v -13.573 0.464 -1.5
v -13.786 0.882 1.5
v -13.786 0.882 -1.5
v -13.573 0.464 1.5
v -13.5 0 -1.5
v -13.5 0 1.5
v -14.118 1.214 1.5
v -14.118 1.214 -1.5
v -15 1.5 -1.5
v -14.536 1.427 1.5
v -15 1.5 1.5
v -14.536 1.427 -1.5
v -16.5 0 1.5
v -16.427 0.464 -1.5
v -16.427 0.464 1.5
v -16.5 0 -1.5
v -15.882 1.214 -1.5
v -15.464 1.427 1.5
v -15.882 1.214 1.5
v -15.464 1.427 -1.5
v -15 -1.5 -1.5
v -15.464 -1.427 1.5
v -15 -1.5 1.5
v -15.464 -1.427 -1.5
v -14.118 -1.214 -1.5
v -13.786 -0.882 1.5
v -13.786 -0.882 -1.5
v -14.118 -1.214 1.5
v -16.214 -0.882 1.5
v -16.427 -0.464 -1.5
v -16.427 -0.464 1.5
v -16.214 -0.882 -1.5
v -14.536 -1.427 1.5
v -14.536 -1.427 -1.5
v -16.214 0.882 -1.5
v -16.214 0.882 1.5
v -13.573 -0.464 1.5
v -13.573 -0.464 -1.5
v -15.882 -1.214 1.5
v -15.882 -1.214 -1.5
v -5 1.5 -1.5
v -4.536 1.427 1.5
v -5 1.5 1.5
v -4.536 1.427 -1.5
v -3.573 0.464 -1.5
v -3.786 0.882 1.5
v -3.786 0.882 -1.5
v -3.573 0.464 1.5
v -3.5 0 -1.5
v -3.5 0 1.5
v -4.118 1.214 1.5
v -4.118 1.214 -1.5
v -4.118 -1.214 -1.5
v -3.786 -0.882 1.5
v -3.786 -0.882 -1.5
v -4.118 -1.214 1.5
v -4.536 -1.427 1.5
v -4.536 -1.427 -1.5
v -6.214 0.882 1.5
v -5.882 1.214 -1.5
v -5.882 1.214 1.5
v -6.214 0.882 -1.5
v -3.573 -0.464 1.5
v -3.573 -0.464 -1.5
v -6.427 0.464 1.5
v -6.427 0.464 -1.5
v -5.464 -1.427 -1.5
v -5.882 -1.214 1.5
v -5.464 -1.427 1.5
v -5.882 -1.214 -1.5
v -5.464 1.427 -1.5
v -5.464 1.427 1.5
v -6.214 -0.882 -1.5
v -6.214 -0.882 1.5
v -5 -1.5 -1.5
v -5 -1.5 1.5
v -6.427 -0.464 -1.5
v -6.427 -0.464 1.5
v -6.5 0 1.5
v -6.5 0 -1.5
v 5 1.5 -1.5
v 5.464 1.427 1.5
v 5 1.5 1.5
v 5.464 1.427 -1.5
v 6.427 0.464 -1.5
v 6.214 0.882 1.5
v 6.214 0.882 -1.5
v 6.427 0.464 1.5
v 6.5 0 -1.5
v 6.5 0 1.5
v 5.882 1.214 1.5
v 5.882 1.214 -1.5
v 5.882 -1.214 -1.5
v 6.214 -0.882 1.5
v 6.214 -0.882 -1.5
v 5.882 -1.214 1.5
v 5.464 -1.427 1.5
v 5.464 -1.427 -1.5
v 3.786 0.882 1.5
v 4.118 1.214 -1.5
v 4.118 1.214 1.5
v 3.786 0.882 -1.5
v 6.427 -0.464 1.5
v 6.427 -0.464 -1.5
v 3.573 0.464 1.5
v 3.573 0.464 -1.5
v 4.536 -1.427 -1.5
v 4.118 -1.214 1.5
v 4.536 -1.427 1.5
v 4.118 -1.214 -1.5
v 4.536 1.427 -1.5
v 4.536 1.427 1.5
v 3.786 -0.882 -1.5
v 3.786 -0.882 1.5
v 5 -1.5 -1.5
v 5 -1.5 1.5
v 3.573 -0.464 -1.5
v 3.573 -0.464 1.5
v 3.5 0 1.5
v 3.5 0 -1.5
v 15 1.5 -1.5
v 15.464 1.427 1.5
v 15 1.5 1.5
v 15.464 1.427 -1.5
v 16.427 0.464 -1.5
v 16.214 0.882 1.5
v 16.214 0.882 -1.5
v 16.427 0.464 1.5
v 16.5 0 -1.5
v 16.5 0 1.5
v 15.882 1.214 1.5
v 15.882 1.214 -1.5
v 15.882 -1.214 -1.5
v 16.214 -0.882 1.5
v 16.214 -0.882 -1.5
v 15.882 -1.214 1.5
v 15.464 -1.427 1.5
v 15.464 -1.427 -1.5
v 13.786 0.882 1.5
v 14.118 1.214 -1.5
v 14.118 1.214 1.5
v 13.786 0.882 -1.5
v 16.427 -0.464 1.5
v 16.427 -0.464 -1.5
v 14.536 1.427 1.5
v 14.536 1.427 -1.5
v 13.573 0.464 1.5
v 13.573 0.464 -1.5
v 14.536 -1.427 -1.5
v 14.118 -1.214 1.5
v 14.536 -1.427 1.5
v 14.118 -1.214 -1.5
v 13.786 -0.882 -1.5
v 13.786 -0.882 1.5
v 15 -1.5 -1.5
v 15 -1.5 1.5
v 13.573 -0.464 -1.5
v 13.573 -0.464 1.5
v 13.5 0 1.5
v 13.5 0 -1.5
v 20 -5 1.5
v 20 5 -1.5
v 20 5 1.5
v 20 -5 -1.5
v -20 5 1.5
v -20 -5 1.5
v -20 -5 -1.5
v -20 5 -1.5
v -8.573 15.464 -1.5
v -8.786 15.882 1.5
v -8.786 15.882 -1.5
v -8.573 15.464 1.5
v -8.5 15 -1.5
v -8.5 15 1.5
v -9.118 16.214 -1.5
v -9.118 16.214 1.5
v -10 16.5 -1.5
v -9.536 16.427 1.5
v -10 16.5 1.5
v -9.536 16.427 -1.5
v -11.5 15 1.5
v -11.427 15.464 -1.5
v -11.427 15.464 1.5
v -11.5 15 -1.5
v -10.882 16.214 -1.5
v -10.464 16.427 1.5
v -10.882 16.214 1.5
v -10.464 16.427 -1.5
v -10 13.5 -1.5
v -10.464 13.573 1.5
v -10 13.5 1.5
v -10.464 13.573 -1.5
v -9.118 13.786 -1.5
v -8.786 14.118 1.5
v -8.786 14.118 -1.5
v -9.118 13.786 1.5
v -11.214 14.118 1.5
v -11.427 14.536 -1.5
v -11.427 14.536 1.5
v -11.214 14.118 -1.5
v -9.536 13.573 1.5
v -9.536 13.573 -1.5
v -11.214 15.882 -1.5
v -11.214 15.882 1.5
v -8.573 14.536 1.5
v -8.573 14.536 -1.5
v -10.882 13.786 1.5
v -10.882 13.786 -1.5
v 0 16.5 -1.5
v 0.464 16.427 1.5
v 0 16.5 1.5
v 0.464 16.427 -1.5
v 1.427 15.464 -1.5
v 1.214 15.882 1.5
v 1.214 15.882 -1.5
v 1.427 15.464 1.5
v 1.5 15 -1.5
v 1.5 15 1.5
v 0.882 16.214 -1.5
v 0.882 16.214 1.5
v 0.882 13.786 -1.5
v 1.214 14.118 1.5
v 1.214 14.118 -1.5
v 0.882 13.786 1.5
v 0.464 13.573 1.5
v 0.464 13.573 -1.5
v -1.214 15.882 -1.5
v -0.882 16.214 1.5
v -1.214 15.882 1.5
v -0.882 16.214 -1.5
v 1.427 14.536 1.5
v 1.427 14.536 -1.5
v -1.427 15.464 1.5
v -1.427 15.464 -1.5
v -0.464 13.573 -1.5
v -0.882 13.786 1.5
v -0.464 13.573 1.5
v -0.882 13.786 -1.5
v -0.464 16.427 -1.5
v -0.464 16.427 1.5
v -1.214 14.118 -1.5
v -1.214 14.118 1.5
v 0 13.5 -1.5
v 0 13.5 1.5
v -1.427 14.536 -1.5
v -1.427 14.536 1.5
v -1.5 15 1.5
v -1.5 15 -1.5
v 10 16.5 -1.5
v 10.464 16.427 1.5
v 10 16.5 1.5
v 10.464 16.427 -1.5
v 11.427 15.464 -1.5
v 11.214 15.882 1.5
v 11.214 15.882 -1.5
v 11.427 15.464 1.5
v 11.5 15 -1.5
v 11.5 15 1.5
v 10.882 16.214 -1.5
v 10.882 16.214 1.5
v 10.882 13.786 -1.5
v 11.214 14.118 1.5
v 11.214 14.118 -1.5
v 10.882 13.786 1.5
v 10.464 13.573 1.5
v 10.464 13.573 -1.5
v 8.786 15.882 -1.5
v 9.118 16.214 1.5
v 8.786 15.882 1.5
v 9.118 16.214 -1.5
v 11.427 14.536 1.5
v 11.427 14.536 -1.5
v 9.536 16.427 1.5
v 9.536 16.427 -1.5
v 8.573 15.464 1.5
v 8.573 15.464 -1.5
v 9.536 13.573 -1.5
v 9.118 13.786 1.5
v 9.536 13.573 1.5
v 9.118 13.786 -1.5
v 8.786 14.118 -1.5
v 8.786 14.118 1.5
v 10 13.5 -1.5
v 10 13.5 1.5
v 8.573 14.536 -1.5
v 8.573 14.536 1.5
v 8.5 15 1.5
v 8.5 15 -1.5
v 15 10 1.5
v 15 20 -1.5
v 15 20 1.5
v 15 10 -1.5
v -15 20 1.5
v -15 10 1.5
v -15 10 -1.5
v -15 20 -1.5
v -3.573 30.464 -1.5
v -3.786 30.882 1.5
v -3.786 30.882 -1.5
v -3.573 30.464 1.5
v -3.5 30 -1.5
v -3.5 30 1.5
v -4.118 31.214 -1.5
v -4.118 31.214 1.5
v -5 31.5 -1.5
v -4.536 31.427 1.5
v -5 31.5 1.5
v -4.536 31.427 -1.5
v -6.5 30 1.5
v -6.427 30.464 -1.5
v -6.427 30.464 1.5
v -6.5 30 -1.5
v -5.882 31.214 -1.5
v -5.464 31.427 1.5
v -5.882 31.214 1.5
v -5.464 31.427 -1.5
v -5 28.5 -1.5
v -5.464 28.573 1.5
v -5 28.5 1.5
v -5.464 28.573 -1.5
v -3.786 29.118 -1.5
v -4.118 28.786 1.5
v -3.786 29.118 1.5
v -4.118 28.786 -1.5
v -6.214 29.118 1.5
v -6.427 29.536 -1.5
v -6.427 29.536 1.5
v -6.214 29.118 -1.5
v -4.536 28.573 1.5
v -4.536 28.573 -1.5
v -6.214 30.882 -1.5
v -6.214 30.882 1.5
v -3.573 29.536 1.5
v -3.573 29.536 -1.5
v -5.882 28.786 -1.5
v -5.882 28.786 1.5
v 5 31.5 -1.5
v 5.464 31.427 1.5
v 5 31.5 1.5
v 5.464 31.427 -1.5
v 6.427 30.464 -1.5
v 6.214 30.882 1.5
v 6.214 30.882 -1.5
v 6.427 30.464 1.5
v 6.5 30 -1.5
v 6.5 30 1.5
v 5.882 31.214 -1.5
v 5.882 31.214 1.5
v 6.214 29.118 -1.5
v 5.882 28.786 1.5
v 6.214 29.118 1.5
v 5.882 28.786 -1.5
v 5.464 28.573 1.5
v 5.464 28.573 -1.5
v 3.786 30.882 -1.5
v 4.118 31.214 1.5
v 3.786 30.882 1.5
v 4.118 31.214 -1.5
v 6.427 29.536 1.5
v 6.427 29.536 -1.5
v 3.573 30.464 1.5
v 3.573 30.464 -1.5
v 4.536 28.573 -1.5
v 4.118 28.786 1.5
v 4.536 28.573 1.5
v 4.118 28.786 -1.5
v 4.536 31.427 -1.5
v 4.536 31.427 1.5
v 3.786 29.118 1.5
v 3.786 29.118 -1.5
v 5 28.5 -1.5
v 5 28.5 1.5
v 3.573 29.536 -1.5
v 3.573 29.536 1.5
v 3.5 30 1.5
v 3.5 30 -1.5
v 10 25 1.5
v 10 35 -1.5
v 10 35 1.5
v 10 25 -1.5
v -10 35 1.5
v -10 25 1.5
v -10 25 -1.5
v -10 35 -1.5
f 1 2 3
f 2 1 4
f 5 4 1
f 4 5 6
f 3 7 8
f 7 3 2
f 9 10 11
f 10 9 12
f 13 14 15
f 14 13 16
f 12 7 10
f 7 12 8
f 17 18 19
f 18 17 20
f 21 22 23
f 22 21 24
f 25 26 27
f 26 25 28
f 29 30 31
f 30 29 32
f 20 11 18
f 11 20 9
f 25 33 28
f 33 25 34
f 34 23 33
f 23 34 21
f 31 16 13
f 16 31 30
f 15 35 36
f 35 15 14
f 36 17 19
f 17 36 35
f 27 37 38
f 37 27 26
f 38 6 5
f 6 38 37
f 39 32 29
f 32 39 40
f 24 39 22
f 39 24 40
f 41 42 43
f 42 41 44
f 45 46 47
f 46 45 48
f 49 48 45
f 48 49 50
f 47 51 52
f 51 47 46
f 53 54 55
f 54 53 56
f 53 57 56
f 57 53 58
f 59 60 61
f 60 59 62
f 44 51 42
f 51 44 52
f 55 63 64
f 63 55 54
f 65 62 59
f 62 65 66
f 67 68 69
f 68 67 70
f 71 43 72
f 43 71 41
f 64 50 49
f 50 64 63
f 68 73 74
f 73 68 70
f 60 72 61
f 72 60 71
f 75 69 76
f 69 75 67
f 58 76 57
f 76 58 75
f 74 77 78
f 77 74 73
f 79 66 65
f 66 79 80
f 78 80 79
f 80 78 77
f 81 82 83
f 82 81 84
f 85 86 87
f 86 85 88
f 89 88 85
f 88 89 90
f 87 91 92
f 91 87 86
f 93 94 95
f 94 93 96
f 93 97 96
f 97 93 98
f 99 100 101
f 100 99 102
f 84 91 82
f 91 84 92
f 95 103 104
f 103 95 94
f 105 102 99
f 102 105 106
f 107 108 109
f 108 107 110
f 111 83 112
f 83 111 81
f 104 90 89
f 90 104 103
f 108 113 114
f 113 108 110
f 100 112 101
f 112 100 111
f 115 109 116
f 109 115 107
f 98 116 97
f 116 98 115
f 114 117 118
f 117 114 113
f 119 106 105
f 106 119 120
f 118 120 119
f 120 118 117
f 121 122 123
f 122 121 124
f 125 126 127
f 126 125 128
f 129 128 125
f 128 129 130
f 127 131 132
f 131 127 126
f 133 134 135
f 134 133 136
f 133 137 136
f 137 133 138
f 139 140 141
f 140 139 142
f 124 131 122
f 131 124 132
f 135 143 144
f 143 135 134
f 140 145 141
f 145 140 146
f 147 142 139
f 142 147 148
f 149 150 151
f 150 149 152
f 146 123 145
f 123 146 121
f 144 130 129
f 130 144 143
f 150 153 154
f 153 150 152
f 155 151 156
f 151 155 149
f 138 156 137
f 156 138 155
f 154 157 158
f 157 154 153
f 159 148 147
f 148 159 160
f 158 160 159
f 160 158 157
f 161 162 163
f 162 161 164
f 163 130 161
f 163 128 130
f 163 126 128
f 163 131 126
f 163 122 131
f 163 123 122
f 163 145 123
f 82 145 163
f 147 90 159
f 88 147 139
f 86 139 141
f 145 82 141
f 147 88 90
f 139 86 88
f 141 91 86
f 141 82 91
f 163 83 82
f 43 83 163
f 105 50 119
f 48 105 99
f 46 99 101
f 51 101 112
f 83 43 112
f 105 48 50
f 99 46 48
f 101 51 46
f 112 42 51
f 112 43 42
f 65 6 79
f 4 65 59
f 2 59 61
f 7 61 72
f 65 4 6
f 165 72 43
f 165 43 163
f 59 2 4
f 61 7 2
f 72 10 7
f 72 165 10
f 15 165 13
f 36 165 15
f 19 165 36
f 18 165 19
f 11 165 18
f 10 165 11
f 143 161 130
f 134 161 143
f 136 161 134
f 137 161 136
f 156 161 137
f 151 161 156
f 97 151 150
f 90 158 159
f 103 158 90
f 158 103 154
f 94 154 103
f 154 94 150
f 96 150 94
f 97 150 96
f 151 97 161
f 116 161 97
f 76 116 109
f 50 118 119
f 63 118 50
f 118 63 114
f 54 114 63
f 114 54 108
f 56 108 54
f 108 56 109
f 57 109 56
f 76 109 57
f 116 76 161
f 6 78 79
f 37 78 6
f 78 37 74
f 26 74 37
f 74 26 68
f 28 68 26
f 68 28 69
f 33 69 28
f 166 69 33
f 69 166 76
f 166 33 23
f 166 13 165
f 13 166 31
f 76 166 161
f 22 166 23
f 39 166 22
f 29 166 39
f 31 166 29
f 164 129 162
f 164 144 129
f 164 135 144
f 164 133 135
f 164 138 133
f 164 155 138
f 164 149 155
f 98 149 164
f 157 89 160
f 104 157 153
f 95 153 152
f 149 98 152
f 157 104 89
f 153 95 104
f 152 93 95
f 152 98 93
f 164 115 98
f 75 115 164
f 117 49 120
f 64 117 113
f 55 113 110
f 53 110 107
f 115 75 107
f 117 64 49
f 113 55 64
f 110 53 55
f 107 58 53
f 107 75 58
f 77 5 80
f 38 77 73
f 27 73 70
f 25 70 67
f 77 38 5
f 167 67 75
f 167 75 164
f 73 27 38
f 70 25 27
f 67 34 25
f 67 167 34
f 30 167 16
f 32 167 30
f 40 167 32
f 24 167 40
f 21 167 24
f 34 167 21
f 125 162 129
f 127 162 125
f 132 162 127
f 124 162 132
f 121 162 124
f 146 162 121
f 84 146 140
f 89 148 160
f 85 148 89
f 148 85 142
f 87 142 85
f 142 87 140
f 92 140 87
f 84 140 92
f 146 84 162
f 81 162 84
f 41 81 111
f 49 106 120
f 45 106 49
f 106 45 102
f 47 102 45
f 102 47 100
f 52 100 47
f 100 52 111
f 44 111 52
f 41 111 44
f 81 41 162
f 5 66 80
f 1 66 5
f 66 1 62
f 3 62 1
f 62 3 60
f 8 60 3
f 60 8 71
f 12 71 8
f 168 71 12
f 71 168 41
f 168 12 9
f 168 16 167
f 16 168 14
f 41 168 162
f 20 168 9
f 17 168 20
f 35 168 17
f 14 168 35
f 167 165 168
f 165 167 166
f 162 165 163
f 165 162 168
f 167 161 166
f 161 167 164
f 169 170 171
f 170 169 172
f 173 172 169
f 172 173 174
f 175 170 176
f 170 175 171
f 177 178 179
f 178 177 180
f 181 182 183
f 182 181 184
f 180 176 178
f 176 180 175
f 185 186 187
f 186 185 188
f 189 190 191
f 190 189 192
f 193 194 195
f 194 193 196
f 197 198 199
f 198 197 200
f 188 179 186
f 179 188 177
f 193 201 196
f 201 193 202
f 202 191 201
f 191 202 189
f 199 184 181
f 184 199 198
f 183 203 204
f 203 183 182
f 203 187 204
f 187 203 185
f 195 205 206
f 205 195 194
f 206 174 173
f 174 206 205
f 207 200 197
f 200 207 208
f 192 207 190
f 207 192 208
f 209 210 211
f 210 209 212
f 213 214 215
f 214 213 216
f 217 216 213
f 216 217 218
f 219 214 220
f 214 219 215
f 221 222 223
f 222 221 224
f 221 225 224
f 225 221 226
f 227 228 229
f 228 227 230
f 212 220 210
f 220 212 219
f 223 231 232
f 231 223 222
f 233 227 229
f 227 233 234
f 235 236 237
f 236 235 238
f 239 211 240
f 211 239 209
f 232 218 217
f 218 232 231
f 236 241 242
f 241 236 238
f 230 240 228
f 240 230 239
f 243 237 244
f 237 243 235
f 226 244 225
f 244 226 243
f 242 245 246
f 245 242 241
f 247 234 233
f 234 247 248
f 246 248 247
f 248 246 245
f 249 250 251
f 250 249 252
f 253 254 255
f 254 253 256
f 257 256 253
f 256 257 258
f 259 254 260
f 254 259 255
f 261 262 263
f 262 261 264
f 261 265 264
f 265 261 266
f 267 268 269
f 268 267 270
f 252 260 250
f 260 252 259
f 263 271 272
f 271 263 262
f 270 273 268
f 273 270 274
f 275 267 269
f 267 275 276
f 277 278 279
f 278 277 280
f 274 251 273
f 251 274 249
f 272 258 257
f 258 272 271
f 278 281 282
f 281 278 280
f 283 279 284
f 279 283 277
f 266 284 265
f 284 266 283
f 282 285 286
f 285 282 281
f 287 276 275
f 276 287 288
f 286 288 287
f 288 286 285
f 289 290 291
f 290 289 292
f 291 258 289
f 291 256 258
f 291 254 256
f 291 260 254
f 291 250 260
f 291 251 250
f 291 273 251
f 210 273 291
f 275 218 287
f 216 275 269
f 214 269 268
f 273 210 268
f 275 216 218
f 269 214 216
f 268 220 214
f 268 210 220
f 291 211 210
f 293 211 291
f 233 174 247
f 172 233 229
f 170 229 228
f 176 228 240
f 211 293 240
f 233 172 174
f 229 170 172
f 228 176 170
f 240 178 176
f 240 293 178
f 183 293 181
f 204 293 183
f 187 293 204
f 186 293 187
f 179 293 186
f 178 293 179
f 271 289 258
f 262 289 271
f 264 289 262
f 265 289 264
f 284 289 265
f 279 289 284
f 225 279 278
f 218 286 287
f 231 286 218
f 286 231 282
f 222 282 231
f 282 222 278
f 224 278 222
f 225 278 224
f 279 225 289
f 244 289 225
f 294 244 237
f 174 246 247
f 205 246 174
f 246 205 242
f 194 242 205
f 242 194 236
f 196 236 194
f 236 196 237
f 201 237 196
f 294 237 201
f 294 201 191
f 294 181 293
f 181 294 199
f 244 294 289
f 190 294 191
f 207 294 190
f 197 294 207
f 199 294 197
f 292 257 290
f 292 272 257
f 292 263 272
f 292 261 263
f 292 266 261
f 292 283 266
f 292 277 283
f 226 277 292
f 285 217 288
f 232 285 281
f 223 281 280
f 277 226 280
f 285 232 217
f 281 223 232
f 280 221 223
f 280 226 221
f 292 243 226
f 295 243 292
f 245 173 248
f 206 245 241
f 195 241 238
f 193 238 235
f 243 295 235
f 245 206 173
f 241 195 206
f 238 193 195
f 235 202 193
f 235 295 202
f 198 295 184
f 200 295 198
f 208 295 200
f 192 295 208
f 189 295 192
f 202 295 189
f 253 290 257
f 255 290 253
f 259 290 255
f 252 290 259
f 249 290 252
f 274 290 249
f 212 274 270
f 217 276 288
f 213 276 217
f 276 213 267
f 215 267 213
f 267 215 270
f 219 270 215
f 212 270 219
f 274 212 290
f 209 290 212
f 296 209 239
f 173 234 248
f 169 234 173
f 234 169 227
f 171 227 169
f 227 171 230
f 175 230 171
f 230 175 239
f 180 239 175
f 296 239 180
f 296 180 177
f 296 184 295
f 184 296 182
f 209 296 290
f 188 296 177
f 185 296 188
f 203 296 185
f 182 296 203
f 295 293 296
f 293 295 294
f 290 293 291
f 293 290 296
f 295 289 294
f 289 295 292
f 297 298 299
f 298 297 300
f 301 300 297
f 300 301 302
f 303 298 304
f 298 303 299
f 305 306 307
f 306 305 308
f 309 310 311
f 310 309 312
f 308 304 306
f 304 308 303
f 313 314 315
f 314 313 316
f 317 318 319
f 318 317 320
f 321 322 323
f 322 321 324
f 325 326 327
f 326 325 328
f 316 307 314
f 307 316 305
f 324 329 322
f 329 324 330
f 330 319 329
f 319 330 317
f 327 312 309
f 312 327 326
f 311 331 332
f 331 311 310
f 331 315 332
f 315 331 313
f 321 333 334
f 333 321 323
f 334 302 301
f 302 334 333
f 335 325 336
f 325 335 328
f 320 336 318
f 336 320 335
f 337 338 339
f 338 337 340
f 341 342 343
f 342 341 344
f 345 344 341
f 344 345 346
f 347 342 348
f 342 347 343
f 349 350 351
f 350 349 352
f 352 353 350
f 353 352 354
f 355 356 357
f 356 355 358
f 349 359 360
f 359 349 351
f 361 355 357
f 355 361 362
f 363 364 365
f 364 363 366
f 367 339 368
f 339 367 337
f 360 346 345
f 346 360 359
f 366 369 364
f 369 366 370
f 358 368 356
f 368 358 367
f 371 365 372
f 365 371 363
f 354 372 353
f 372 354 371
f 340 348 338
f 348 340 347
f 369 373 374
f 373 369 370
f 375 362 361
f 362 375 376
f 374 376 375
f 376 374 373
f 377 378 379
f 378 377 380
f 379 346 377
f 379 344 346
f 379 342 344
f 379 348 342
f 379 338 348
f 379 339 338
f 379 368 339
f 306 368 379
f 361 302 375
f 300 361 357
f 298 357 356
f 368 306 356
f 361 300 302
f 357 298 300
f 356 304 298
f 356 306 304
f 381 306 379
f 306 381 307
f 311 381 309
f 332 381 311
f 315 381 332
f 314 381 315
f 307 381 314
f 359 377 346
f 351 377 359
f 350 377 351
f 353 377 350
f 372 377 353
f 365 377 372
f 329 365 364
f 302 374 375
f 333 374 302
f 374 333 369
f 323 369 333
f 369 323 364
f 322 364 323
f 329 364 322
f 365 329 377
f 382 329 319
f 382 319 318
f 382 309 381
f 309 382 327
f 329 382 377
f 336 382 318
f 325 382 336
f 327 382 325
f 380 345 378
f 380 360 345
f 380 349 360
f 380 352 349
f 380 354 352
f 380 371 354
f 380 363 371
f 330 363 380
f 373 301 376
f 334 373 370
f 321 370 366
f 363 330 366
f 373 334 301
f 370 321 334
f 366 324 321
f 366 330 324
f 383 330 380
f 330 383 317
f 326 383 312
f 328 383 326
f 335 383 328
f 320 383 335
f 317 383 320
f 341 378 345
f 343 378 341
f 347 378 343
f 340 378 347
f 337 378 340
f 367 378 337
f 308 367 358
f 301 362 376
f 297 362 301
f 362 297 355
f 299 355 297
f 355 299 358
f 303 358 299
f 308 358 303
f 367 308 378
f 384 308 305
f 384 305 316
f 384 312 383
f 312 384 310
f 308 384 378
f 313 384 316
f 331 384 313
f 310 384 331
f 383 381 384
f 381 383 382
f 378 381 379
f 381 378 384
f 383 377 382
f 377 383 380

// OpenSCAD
// file: pieza_mecano.scad
use <./utils/build_plate.scad> // Cuadricula transparente para la base
build_plate(3, 200,100); // No se incluye al renderizar


module pieza_mecano(drill=3, d=10, n=4, anchura=10, grosor=3)
{

  //-- Calcular la longitud de la pieza
  lx = n*d;

  //-- Construimos la pieza
  difference() {
    //-- Cuerpo de la pieza
    cube([lx,anchura,grosor],center=true);

    //-- Taladros
    translate([-lx/2+d/2,0,0])
      for (i=[0:n-1]) {
        translate([i*d,0,0])
          cylinder(r=drill/2, h=grosor+5, $fn=20,center=true);
    }
  }
}

//-- Ejemplos de utilizacion
pieza_mecano();


translate([0,20,0])
  pieza_mecano(n=2);
// file: utils/build_plate.scad
// Build Plate representation module
// Made by Makerbot (http://curriculum.makerbot.com/daily_lessons/february/openscad_buildplate.html)

//use this to include a build plate visualization in your openSCAD scripts. Very useful for things designed to be edited in Makerbot Customizer

//to use, either include or use <utils/build_plate.scad>

//then just call build_plate(); with the following arguments (also, you have to have a real object in your scene for this to render)

//putting 0 as the first argument will give you a Replicator 2 build plate
//putting 1 as the first argument will give you a Replicator 1 build plate
//putting 2 as the first argument will give you a Thingomatic build plate
//putting 3 as the first argument will give you a manually adjustable build plate (note: if you use this option, you need to specify your build plates X length (in mm) as the second argument and the Y length (in mm) as the third argument. eg. build_plate(3,150,120);)

/*

to give your user control of which build plate they see in Customizer, include the following code:

use <utils/build_plate.scad>

//for display only, doesn't contribute to final object
build_plate_selector = 0; //[0:Replicator 2,1: Replicator,2:Thingomatic,3:Manual]
//when Build Plate Selector is set to "manual" this controls the build plate x dimension
build_plate_manual_x = 100; //[100:400]
//when Build Plate Selector is set to "manual" this controls the build plate y dimension
build_plate_manual_y = 100; //[100:400]

build_plate(build_plate_selector,build_plate_manual_x,build_plate_manual_y);

*/




//to see how this works, uncomment the following code

//build_plate_selector = 0; //[0:Replicator 2,1: Replicator,2:Thingomatic,3:Manual]
//build_plate_manual_x = 100; //[100:400]
//build_plate_manual_y = 100; //[100:400]
//
//build_plate(build_plate_selector,build_plate_manual_x,build_plate_manual_y);
//
//cube(5);


module build_plate(bp,manX,manY){

		translate([0,0,-.52]){
			if(bp == 0){
				%cube([285,153,1],center = true);
			}
			if(bp == 1){
				%cube([225,145,1],center = true);
			}
			if(bp == 2){
				%cube([120,120,1],center = true);
			}
			if(bp == 3){
				%cube([manX,manY,1],center = true);
			}
		
		}
		translate([0,0,-.5]){
			if(bp == 0){
				for(i = [-14:14]){
					translate([i*10,0,0])
					%cube([.5,153,1.01],center = true);
				}
				for(i = [-7:7]){
					translate([0,i*10,0])
					%cube([285,.5,1.01],center = true);
				}	
			}
			if(bp == 1){
				for(i = [-11:11]){
					translate([i*10,0,0])
						%cube([.5,145,1.01],center = true);
				}
				for(i = [-7:7]){
					translate([0,i*10,0])
						%cube([225,.5,1.01],center = true);
				}
			}
			if(bp == 2){
				for(i = [-6:6]){
					translate([i*10,0,0])
						%cube([.5,120,1.01],center = true);
				}
				for(i = [-6:6]){
					translate([0,i*10,0])
						%cube([120,.5,1.01],center = true);
				}
			}
			if(bp == 3){
				for(i = [-(floor(manX/20)):floor(manX/20)]){
					translate([i*10,0,0])
						%cube([.5,manY,1.01],center = true);
				}
				for(i = [-(floor(manY/20)):floor(manY/20)]){
					translate([0,i*10,0])
						%cube([manX,.5,1.01],center = true);
				}
			}
		}
}
// main file
use <./utils/build_plate.scad> // Cuadricula transparente para la base
build_plate(3, 200,100); // No se incluye al renderizar


//----------------------------------------------------------
//-- Tutorial OpenScad
//-- Juan Gonzalez-Gomez (Obijuan) juan@iearobotics.com
//----------------------------------------------------------
//-- (c) Mayo, 2012
//-- Licencia GPL
//----------------------------------------------------------
//-- Ejemplo 1: Pieza de mecano
//-- Se colocan 3 piezas de mecano para su impresion
//----------------------------------------------------------

use <pieza_mecano.scad>

pieza_mecano();

translate([0,15,0])
  pieza_mecano(n=3);

translate([0,30,0])
  pieza_mecano(n=2);
